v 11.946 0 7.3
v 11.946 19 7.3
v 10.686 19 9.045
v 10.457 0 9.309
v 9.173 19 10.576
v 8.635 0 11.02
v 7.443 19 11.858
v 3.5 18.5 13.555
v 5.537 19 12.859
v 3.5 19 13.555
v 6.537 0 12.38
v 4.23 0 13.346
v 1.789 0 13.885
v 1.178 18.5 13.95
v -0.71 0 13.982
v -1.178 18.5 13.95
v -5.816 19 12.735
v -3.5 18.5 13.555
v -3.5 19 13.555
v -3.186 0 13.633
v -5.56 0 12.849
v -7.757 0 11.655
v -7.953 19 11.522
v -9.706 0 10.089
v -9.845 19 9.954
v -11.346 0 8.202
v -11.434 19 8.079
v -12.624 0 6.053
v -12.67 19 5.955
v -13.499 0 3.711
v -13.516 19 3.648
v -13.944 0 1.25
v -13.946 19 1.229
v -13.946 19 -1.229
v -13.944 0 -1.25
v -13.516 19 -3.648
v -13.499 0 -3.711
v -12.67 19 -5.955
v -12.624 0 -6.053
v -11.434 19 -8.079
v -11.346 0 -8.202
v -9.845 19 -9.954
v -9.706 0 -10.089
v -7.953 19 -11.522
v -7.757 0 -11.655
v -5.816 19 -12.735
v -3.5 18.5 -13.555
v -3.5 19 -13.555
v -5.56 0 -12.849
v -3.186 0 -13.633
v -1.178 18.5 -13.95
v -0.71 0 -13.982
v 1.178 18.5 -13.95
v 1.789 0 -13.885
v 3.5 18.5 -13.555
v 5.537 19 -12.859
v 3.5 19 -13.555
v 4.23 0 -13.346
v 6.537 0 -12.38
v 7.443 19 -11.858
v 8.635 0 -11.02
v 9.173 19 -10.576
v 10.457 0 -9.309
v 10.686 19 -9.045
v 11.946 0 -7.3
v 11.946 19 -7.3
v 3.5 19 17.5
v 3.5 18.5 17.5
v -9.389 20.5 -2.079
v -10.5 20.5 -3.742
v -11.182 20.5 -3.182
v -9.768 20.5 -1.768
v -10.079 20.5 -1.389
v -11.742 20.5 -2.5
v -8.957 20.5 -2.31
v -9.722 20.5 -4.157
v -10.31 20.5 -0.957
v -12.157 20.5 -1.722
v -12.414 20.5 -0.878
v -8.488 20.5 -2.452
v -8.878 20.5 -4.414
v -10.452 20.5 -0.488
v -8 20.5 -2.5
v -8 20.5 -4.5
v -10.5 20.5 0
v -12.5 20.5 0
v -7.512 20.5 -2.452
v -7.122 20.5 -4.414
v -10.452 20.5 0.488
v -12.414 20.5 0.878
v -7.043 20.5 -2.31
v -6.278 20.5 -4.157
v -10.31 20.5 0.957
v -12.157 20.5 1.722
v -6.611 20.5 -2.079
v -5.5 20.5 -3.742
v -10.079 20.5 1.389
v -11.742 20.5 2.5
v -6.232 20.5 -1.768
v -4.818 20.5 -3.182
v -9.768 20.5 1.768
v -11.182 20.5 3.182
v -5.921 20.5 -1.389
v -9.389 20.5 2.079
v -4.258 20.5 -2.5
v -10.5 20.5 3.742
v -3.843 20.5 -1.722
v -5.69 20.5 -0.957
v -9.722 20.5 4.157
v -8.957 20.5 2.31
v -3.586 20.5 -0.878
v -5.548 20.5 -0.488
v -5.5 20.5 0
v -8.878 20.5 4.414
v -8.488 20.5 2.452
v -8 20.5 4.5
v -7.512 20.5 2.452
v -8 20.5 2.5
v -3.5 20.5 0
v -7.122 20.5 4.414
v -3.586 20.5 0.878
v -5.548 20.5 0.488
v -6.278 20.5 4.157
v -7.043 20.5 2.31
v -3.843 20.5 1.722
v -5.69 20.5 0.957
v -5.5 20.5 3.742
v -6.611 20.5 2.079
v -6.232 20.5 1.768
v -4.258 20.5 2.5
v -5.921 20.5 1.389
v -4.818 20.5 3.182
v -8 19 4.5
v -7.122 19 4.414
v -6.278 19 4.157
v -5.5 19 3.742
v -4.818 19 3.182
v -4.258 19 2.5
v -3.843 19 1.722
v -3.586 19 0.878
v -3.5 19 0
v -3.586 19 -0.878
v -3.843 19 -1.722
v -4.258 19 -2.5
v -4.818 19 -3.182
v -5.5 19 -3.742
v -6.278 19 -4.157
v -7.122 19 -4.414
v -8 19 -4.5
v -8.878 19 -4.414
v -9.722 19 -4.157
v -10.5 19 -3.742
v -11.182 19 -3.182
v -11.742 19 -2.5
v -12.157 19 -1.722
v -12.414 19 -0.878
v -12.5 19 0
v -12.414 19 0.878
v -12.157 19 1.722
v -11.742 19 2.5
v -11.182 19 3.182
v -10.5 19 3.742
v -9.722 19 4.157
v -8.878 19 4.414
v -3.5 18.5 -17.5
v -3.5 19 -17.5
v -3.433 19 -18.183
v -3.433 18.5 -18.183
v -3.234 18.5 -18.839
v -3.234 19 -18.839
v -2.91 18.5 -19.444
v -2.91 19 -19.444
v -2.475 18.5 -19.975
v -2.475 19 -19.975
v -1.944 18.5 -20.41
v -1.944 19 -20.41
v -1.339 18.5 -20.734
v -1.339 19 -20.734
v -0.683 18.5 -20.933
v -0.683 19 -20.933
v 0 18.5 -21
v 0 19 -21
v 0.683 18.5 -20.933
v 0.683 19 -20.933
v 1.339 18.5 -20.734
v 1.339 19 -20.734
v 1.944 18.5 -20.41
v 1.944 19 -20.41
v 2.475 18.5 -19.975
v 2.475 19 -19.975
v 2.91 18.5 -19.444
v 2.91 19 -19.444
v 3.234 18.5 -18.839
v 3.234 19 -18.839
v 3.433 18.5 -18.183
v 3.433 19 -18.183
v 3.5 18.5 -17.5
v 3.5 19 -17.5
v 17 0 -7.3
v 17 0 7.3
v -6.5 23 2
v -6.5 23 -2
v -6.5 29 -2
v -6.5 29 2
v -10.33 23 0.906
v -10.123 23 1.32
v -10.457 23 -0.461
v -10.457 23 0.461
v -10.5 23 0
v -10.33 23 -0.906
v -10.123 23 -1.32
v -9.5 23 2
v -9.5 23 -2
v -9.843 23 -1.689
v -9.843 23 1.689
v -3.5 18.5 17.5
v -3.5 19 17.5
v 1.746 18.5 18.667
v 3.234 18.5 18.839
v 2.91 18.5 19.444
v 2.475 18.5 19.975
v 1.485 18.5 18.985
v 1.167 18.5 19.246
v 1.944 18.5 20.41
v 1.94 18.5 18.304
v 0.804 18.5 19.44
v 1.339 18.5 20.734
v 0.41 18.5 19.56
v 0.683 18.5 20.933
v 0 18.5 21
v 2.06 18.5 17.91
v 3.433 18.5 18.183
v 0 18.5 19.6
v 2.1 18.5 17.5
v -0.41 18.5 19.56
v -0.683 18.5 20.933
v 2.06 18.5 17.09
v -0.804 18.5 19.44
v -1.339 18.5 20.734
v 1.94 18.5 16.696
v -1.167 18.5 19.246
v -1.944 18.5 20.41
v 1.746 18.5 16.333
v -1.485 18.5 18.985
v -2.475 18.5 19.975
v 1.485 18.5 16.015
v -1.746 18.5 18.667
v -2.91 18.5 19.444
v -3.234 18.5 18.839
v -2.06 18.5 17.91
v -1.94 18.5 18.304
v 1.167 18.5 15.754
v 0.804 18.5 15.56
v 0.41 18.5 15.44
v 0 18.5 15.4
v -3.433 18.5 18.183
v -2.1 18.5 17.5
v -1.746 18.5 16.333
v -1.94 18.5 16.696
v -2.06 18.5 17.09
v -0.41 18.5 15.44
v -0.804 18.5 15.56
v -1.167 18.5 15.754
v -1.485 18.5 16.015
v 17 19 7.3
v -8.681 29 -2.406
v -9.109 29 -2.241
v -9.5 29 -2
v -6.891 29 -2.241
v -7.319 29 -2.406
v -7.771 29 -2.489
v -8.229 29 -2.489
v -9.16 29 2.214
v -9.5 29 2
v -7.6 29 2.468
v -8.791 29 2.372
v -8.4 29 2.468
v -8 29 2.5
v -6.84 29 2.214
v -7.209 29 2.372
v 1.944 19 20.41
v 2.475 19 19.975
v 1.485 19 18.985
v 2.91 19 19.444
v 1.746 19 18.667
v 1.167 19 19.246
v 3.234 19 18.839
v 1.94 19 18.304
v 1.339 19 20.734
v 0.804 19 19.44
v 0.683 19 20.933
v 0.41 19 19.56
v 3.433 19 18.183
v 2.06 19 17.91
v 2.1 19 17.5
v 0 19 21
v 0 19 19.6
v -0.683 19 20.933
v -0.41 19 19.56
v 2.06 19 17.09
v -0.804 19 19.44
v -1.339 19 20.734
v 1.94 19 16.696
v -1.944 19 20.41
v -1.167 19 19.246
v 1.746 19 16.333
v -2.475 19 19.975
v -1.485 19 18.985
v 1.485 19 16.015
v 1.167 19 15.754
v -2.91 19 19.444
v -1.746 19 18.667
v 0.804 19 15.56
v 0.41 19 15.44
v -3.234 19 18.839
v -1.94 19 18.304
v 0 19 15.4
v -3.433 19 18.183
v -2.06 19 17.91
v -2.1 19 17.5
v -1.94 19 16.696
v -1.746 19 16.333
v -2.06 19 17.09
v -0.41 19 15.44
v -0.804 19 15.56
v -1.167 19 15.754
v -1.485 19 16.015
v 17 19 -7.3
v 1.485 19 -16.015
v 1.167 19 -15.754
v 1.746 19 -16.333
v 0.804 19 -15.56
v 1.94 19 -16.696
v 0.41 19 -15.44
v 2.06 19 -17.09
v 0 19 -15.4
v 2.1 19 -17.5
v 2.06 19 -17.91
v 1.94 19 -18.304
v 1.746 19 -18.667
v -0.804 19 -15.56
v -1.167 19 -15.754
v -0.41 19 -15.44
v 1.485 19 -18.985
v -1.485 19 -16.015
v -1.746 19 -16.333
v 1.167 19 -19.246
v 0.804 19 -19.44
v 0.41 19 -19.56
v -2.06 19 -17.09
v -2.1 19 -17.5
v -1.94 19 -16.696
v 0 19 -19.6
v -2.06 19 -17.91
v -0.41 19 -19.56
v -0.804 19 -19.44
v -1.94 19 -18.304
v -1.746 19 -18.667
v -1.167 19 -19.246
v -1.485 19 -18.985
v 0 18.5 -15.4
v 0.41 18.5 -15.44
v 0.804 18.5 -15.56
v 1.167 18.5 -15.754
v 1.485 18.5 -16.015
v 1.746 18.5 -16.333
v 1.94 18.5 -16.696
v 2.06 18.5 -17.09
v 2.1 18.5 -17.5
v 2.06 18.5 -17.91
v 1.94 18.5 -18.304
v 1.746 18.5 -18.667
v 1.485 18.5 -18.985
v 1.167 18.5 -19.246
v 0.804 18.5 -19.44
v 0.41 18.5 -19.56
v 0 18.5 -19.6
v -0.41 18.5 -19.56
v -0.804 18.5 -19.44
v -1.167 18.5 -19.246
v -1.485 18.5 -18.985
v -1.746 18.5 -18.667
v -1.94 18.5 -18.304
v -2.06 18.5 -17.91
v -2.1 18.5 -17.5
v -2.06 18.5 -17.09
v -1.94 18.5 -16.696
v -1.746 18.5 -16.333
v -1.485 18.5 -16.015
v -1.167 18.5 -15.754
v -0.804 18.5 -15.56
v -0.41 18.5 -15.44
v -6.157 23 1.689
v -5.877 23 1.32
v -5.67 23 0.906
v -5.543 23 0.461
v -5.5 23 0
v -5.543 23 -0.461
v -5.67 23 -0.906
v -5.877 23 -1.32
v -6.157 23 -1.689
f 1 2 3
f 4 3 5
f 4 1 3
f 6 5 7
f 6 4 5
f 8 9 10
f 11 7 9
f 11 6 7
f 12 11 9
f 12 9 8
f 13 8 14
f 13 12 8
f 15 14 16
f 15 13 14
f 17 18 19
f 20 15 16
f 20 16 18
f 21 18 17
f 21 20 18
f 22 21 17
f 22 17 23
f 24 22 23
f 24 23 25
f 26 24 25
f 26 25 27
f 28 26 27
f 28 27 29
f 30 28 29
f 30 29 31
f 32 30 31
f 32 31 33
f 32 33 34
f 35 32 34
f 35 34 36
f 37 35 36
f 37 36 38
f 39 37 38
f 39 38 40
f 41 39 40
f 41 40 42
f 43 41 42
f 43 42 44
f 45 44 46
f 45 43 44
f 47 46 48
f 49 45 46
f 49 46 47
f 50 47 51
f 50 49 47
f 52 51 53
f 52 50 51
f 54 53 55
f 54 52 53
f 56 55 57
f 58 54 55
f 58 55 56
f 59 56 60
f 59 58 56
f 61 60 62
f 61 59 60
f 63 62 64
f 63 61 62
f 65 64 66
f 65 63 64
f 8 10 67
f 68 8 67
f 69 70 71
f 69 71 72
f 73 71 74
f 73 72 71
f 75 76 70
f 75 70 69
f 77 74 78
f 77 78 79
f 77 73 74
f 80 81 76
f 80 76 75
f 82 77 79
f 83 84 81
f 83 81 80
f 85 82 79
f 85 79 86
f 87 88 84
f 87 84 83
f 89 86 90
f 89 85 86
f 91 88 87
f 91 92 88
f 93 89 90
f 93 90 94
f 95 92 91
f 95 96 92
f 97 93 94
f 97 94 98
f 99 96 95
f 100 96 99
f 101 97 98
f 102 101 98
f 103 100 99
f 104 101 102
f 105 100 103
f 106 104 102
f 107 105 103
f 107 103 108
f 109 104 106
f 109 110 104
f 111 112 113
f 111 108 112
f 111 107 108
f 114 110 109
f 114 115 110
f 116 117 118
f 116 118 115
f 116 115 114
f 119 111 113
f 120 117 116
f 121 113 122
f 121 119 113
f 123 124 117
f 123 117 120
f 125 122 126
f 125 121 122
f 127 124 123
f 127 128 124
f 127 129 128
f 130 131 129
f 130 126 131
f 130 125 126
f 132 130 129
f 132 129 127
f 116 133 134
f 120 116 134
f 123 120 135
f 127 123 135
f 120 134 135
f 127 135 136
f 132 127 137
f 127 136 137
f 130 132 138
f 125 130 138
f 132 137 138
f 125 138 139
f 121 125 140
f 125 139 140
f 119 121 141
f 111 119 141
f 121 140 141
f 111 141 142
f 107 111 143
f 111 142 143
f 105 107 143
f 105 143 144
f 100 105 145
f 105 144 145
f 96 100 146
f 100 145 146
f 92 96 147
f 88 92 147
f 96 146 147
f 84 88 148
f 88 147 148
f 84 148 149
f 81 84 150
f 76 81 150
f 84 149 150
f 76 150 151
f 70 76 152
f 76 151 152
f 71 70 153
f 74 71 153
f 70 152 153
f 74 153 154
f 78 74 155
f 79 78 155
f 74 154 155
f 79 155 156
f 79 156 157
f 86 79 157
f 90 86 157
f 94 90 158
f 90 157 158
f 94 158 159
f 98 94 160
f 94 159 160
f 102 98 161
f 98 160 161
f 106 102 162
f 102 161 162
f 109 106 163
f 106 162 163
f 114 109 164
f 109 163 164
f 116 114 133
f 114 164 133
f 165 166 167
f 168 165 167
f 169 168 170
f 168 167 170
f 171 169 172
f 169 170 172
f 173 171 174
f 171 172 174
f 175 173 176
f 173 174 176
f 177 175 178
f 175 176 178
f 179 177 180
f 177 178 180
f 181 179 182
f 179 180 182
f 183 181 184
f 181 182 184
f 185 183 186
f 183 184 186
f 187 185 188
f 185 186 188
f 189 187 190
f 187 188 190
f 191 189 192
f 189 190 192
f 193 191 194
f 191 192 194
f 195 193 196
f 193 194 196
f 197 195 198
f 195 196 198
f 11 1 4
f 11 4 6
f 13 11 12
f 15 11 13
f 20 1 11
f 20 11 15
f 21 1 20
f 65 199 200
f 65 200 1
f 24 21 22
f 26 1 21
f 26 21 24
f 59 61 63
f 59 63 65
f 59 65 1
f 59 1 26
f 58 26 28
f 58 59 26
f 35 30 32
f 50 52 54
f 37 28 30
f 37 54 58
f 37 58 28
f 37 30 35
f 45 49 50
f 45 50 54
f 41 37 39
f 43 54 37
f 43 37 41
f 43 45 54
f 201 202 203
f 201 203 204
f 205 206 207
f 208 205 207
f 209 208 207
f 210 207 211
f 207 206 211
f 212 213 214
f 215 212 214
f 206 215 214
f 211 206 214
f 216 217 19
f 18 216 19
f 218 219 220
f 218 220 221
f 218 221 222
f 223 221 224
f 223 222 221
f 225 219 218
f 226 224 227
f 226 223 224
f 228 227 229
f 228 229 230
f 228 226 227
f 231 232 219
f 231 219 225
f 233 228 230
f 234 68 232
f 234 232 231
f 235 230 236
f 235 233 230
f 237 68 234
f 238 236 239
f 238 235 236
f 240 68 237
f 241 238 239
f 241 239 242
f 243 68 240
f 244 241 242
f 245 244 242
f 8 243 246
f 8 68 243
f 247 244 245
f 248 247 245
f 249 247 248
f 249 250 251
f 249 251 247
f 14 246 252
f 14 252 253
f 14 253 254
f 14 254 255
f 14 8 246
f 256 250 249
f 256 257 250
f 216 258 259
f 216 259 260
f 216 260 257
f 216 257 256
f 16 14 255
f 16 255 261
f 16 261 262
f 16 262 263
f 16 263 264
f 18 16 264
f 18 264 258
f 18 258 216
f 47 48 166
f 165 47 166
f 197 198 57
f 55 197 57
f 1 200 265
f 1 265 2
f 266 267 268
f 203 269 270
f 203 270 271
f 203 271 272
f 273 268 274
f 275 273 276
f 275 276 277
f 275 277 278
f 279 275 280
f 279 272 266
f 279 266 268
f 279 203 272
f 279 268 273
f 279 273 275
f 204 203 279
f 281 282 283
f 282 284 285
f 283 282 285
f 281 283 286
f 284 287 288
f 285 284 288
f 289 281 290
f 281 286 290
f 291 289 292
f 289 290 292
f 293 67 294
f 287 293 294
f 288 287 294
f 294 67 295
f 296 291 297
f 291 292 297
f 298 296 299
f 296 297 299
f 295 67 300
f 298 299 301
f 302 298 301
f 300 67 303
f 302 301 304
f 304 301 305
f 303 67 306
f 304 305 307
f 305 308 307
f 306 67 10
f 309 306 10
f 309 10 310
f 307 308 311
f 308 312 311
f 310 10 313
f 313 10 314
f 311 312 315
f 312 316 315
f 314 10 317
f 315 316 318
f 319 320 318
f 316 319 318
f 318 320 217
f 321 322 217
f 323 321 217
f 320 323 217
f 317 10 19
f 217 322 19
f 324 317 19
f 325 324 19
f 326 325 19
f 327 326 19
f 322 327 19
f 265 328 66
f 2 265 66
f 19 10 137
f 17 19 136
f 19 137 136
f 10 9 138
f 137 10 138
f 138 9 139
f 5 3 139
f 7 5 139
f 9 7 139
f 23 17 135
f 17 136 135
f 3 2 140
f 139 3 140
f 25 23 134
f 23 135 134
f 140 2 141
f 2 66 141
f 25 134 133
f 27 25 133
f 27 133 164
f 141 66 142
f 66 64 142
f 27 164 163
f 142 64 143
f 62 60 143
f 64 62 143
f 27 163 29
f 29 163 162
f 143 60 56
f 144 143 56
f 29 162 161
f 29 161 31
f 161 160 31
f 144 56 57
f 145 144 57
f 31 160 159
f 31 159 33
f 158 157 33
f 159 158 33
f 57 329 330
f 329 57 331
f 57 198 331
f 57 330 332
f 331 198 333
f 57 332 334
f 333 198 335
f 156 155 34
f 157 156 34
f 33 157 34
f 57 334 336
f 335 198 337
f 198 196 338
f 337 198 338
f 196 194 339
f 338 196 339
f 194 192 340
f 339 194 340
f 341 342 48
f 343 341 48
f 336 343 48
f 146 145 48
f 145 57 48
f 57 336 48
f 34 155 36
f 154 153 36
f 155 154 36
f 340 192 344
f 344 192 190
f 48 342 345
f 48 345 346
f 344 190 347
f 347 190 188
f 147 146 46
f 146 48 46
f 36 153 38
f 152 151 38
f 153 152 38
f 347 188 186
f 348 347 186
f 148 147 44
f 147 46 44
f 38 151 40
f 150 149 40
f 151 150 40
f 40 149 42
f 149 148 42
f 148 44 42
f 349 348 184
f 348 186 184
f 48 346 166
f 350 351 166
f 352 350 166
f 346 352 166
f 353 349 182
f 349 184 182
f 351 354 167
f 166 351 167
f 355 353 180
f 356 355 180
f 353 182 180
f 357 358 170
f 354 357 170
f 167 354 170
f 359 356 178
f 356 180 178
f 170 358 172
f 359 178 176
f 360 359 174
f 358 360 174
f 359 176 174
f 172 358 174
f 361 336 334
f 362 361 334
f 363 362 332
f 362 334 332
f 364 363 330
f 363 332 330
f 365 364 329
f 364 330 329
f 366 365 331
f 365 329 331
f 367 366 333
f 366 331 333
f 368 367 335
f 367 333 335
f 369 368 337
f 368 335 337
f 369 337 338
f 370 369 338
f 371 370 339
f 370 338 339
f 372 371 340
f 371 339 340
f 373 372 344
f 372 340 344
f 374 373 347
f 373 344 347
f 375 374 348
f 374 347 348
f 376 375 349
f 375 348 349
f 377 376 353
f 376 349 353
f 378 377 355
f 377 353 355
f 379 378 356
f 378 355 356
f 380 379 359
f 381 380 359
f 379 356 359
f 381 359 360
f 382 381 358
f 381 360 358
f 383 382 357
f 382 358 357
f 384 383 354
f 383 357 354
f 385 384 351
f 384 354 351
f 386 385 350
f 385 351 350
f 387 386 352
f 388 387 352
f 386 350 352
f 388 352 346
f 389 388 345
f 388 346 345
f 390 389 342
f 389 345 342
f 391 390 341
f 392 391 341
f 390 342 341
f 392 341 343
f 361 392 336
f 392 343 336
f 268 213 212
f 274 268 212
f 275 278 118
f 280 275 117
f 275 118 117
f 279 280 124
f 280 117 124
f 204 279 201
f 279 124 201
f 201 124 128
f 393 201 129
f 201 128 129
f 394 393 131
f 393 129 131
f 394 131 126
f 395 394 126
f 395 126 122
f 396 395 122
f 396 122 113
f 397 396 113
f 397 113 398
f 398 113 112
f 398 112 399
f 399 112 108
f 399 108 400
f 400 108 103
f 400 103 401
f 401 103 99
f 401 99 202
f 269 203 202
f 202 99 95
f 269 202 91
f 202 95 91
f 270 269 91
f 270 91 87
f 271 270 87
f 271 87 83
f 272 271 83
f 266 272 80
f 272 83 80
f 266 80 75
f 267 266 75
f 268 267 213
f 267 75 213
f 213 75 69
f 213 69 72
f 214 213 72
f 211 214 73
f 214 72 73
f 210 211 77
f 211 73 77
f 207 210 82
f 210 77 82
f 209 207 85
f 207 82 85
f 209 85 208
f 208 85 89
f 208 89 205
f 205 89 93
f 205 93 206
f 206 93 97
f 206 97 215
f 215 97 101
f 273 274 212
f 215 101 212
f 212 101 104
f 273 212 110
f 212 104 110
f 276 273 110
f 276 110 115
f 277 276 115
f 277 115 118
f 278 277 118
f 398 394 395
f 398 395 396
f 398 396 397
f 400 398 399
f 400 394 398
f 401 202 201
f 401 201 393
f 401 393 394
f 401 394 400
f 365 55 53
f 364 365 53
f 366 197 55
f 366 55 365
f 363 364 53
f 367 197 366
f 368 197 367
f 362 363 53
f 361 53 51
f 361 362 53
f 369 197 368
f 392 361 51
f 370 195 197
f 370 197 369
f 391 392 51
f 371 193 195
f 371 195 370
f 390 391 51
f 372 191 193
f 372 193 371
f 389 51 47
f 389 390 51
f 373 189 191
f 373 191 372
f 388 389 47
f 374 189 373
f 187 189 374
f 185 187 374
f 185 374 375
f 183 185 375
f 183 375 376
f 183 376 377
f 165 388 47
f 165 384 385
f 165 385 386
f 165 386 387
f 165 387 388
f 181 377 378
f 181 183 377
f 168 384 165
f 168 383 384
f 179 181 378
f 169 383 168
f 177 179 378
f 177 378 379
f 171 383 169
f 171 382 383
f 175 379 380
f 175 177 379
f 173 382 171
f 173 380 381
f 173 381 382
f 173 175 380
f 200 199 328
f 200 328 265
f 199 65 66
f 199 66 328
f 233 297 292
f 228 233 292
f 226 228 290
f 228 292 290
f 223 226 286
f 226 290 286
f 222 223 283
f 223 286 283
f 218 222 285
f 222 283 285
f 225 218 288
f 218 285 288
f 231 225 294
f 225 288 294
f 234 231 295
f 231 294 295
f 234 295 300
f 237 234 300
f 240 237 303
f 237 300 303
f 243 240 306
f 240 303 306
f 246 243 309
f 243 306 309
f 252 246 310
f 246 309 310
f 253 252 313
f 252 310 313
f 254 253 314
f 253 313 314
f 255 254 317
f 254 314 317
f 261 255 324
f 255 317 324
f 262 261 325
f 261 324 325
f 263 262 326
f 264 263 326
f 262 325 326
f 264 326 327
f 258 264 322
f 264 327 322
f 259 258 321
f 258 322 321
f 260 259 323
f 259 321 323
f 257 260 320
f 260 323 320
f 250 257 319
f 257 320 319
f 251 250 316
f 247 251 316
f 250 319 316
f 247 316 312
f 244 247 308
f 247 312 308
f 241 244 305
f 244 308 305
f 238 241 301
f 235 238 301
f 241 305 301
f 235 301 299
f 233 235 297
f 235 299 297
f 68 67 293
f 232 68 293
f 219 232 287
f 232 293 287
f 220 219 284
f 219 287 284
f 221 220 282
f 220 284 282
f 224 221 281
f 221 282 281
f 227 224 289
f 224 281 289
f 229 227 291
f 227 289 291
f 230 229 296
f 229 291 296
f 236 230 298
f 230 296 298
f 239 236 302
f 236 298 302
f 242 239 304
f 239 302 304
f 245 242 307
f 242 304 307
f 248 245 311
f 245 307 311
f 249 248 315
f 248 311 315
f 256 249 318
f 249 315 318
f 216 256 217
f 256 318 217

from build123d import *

# Parameters (mm, degrees)
BOSS_EXTRUDE1_DEPTH = 19
SKETCH3_R           = 2.1
BOSS_EXTRUDE2_DEPTH = 0.5
SKETCH4_R           = 4.5
BOSS_EXTRUDE3_DEPTH = 1.5
SKETCH5_R           = 2.5
BOSS_EXTRUDE4_DEPTH = 8.5
CUT_EXTRUDE1_START  = -6
CUT_EXTRUDE1_DEPTH  = 6


with BuildPart() as part:
    # Sketch1 → Boss-Extrude1 (new body)
    with BuildSketch(Plane(origin=(0, 0, 0), x_dir=(1, 0, 0), z_dir=(0, 1, 0))):
        with BuildLine():
            Line((11.94612908, 7.3), (17, 7.3))
            Line((17, 7.3), (17, -7.3))
            Line((17, -7.3), (11.94612908, -7.3))
            ThreePointArc((11.94612908, -7.3), (-14, 0), (11.94612908, 7.3))
        make_face()
    extrude(amount=BOSS_EXTRUDE1_DEPTH)

    # Sketch3 → Boss-Extrude2 (add)
    with BuildSketch(Plane(origin=(0, 19, 0), x_dir=(1, 0, 0), z_dir=(0, 1, 0))):
        with BuildLine():
            Line((3.5, 17.5), (3.5, -17.5))
            ThreePointArc((3.5, -17.5), (0, -21), (-3.5, -17.5))
            Line((-3.5, -17.5), (-3.5, 17.5))
            ThreePointArc((-3.5, 17.5), (0, 21), (3.5, 17.5))
        make_face()
        with Locations(Location((0, -17.5, 0), (0, 0, 270))):
            Circle(SKETCH3_R, mode=Mode.SUBTRACT)
        with Locations(Location((0, 17.5, 0), (0, 0, 270))):
            Circle(SKETCH3_R, mode=Mode.SUBTRACT)
    extrude(amount=-BOSS_EXTRUDE2_DEPTH)

    # Sketch4 → Boss-Extrude3 (add)
    with BuildSketch(Plane(origin=(0, 19, 0), x_dir=(1, 0, 0), z_dir=(0, 1, 0))):
        with Locations(Location((-8, 0, 0), (0, 0, 270))):
            Circle(SKETCH4_R)
    extrude(amount=BOSS_EXTRUDE3_DEPTH)

    # Sketch5 → Boss-Extrude4 (add)
    with BuildSketch(Plane(origin=(0, 20.5, 0), x_dir=(1, 0, 0), z_dir=(0, 1, 0))):
        with Locations(Location((-8, 0, 0), (0, 0, 270))):
            Circle(SKETCH5_R)
    extrude(amount=BOSS_EXTRUDE4_DEPTH)

    # Sketch6 → Cut-Extrude1 (cut)
    with BuildSketch(Plane(origin=(0, 29, 0), x_dir=(1, 0, 0), z_dir=(0, 1, 0)).offset(CUT_EXTRUDE1_START)):
        with BuildLine():
            Line((-9.5, 2), (-9.5, -2))
            ThreePointArc((-9.5, -2), (-10.5, 0), (-9.5, 2))
        make_face()
        with BuildLine():
            Line((-6.5, 2), (-6.5, -2))
            ThreePointArc((-6.5, -2), (-5.5, 0), (-6.5, 2))
        make_face()
    extrude(amount=CUT_EXTRUDE1_DEPTH, mode=Mode.SUBTRACT)


solid = part.part
